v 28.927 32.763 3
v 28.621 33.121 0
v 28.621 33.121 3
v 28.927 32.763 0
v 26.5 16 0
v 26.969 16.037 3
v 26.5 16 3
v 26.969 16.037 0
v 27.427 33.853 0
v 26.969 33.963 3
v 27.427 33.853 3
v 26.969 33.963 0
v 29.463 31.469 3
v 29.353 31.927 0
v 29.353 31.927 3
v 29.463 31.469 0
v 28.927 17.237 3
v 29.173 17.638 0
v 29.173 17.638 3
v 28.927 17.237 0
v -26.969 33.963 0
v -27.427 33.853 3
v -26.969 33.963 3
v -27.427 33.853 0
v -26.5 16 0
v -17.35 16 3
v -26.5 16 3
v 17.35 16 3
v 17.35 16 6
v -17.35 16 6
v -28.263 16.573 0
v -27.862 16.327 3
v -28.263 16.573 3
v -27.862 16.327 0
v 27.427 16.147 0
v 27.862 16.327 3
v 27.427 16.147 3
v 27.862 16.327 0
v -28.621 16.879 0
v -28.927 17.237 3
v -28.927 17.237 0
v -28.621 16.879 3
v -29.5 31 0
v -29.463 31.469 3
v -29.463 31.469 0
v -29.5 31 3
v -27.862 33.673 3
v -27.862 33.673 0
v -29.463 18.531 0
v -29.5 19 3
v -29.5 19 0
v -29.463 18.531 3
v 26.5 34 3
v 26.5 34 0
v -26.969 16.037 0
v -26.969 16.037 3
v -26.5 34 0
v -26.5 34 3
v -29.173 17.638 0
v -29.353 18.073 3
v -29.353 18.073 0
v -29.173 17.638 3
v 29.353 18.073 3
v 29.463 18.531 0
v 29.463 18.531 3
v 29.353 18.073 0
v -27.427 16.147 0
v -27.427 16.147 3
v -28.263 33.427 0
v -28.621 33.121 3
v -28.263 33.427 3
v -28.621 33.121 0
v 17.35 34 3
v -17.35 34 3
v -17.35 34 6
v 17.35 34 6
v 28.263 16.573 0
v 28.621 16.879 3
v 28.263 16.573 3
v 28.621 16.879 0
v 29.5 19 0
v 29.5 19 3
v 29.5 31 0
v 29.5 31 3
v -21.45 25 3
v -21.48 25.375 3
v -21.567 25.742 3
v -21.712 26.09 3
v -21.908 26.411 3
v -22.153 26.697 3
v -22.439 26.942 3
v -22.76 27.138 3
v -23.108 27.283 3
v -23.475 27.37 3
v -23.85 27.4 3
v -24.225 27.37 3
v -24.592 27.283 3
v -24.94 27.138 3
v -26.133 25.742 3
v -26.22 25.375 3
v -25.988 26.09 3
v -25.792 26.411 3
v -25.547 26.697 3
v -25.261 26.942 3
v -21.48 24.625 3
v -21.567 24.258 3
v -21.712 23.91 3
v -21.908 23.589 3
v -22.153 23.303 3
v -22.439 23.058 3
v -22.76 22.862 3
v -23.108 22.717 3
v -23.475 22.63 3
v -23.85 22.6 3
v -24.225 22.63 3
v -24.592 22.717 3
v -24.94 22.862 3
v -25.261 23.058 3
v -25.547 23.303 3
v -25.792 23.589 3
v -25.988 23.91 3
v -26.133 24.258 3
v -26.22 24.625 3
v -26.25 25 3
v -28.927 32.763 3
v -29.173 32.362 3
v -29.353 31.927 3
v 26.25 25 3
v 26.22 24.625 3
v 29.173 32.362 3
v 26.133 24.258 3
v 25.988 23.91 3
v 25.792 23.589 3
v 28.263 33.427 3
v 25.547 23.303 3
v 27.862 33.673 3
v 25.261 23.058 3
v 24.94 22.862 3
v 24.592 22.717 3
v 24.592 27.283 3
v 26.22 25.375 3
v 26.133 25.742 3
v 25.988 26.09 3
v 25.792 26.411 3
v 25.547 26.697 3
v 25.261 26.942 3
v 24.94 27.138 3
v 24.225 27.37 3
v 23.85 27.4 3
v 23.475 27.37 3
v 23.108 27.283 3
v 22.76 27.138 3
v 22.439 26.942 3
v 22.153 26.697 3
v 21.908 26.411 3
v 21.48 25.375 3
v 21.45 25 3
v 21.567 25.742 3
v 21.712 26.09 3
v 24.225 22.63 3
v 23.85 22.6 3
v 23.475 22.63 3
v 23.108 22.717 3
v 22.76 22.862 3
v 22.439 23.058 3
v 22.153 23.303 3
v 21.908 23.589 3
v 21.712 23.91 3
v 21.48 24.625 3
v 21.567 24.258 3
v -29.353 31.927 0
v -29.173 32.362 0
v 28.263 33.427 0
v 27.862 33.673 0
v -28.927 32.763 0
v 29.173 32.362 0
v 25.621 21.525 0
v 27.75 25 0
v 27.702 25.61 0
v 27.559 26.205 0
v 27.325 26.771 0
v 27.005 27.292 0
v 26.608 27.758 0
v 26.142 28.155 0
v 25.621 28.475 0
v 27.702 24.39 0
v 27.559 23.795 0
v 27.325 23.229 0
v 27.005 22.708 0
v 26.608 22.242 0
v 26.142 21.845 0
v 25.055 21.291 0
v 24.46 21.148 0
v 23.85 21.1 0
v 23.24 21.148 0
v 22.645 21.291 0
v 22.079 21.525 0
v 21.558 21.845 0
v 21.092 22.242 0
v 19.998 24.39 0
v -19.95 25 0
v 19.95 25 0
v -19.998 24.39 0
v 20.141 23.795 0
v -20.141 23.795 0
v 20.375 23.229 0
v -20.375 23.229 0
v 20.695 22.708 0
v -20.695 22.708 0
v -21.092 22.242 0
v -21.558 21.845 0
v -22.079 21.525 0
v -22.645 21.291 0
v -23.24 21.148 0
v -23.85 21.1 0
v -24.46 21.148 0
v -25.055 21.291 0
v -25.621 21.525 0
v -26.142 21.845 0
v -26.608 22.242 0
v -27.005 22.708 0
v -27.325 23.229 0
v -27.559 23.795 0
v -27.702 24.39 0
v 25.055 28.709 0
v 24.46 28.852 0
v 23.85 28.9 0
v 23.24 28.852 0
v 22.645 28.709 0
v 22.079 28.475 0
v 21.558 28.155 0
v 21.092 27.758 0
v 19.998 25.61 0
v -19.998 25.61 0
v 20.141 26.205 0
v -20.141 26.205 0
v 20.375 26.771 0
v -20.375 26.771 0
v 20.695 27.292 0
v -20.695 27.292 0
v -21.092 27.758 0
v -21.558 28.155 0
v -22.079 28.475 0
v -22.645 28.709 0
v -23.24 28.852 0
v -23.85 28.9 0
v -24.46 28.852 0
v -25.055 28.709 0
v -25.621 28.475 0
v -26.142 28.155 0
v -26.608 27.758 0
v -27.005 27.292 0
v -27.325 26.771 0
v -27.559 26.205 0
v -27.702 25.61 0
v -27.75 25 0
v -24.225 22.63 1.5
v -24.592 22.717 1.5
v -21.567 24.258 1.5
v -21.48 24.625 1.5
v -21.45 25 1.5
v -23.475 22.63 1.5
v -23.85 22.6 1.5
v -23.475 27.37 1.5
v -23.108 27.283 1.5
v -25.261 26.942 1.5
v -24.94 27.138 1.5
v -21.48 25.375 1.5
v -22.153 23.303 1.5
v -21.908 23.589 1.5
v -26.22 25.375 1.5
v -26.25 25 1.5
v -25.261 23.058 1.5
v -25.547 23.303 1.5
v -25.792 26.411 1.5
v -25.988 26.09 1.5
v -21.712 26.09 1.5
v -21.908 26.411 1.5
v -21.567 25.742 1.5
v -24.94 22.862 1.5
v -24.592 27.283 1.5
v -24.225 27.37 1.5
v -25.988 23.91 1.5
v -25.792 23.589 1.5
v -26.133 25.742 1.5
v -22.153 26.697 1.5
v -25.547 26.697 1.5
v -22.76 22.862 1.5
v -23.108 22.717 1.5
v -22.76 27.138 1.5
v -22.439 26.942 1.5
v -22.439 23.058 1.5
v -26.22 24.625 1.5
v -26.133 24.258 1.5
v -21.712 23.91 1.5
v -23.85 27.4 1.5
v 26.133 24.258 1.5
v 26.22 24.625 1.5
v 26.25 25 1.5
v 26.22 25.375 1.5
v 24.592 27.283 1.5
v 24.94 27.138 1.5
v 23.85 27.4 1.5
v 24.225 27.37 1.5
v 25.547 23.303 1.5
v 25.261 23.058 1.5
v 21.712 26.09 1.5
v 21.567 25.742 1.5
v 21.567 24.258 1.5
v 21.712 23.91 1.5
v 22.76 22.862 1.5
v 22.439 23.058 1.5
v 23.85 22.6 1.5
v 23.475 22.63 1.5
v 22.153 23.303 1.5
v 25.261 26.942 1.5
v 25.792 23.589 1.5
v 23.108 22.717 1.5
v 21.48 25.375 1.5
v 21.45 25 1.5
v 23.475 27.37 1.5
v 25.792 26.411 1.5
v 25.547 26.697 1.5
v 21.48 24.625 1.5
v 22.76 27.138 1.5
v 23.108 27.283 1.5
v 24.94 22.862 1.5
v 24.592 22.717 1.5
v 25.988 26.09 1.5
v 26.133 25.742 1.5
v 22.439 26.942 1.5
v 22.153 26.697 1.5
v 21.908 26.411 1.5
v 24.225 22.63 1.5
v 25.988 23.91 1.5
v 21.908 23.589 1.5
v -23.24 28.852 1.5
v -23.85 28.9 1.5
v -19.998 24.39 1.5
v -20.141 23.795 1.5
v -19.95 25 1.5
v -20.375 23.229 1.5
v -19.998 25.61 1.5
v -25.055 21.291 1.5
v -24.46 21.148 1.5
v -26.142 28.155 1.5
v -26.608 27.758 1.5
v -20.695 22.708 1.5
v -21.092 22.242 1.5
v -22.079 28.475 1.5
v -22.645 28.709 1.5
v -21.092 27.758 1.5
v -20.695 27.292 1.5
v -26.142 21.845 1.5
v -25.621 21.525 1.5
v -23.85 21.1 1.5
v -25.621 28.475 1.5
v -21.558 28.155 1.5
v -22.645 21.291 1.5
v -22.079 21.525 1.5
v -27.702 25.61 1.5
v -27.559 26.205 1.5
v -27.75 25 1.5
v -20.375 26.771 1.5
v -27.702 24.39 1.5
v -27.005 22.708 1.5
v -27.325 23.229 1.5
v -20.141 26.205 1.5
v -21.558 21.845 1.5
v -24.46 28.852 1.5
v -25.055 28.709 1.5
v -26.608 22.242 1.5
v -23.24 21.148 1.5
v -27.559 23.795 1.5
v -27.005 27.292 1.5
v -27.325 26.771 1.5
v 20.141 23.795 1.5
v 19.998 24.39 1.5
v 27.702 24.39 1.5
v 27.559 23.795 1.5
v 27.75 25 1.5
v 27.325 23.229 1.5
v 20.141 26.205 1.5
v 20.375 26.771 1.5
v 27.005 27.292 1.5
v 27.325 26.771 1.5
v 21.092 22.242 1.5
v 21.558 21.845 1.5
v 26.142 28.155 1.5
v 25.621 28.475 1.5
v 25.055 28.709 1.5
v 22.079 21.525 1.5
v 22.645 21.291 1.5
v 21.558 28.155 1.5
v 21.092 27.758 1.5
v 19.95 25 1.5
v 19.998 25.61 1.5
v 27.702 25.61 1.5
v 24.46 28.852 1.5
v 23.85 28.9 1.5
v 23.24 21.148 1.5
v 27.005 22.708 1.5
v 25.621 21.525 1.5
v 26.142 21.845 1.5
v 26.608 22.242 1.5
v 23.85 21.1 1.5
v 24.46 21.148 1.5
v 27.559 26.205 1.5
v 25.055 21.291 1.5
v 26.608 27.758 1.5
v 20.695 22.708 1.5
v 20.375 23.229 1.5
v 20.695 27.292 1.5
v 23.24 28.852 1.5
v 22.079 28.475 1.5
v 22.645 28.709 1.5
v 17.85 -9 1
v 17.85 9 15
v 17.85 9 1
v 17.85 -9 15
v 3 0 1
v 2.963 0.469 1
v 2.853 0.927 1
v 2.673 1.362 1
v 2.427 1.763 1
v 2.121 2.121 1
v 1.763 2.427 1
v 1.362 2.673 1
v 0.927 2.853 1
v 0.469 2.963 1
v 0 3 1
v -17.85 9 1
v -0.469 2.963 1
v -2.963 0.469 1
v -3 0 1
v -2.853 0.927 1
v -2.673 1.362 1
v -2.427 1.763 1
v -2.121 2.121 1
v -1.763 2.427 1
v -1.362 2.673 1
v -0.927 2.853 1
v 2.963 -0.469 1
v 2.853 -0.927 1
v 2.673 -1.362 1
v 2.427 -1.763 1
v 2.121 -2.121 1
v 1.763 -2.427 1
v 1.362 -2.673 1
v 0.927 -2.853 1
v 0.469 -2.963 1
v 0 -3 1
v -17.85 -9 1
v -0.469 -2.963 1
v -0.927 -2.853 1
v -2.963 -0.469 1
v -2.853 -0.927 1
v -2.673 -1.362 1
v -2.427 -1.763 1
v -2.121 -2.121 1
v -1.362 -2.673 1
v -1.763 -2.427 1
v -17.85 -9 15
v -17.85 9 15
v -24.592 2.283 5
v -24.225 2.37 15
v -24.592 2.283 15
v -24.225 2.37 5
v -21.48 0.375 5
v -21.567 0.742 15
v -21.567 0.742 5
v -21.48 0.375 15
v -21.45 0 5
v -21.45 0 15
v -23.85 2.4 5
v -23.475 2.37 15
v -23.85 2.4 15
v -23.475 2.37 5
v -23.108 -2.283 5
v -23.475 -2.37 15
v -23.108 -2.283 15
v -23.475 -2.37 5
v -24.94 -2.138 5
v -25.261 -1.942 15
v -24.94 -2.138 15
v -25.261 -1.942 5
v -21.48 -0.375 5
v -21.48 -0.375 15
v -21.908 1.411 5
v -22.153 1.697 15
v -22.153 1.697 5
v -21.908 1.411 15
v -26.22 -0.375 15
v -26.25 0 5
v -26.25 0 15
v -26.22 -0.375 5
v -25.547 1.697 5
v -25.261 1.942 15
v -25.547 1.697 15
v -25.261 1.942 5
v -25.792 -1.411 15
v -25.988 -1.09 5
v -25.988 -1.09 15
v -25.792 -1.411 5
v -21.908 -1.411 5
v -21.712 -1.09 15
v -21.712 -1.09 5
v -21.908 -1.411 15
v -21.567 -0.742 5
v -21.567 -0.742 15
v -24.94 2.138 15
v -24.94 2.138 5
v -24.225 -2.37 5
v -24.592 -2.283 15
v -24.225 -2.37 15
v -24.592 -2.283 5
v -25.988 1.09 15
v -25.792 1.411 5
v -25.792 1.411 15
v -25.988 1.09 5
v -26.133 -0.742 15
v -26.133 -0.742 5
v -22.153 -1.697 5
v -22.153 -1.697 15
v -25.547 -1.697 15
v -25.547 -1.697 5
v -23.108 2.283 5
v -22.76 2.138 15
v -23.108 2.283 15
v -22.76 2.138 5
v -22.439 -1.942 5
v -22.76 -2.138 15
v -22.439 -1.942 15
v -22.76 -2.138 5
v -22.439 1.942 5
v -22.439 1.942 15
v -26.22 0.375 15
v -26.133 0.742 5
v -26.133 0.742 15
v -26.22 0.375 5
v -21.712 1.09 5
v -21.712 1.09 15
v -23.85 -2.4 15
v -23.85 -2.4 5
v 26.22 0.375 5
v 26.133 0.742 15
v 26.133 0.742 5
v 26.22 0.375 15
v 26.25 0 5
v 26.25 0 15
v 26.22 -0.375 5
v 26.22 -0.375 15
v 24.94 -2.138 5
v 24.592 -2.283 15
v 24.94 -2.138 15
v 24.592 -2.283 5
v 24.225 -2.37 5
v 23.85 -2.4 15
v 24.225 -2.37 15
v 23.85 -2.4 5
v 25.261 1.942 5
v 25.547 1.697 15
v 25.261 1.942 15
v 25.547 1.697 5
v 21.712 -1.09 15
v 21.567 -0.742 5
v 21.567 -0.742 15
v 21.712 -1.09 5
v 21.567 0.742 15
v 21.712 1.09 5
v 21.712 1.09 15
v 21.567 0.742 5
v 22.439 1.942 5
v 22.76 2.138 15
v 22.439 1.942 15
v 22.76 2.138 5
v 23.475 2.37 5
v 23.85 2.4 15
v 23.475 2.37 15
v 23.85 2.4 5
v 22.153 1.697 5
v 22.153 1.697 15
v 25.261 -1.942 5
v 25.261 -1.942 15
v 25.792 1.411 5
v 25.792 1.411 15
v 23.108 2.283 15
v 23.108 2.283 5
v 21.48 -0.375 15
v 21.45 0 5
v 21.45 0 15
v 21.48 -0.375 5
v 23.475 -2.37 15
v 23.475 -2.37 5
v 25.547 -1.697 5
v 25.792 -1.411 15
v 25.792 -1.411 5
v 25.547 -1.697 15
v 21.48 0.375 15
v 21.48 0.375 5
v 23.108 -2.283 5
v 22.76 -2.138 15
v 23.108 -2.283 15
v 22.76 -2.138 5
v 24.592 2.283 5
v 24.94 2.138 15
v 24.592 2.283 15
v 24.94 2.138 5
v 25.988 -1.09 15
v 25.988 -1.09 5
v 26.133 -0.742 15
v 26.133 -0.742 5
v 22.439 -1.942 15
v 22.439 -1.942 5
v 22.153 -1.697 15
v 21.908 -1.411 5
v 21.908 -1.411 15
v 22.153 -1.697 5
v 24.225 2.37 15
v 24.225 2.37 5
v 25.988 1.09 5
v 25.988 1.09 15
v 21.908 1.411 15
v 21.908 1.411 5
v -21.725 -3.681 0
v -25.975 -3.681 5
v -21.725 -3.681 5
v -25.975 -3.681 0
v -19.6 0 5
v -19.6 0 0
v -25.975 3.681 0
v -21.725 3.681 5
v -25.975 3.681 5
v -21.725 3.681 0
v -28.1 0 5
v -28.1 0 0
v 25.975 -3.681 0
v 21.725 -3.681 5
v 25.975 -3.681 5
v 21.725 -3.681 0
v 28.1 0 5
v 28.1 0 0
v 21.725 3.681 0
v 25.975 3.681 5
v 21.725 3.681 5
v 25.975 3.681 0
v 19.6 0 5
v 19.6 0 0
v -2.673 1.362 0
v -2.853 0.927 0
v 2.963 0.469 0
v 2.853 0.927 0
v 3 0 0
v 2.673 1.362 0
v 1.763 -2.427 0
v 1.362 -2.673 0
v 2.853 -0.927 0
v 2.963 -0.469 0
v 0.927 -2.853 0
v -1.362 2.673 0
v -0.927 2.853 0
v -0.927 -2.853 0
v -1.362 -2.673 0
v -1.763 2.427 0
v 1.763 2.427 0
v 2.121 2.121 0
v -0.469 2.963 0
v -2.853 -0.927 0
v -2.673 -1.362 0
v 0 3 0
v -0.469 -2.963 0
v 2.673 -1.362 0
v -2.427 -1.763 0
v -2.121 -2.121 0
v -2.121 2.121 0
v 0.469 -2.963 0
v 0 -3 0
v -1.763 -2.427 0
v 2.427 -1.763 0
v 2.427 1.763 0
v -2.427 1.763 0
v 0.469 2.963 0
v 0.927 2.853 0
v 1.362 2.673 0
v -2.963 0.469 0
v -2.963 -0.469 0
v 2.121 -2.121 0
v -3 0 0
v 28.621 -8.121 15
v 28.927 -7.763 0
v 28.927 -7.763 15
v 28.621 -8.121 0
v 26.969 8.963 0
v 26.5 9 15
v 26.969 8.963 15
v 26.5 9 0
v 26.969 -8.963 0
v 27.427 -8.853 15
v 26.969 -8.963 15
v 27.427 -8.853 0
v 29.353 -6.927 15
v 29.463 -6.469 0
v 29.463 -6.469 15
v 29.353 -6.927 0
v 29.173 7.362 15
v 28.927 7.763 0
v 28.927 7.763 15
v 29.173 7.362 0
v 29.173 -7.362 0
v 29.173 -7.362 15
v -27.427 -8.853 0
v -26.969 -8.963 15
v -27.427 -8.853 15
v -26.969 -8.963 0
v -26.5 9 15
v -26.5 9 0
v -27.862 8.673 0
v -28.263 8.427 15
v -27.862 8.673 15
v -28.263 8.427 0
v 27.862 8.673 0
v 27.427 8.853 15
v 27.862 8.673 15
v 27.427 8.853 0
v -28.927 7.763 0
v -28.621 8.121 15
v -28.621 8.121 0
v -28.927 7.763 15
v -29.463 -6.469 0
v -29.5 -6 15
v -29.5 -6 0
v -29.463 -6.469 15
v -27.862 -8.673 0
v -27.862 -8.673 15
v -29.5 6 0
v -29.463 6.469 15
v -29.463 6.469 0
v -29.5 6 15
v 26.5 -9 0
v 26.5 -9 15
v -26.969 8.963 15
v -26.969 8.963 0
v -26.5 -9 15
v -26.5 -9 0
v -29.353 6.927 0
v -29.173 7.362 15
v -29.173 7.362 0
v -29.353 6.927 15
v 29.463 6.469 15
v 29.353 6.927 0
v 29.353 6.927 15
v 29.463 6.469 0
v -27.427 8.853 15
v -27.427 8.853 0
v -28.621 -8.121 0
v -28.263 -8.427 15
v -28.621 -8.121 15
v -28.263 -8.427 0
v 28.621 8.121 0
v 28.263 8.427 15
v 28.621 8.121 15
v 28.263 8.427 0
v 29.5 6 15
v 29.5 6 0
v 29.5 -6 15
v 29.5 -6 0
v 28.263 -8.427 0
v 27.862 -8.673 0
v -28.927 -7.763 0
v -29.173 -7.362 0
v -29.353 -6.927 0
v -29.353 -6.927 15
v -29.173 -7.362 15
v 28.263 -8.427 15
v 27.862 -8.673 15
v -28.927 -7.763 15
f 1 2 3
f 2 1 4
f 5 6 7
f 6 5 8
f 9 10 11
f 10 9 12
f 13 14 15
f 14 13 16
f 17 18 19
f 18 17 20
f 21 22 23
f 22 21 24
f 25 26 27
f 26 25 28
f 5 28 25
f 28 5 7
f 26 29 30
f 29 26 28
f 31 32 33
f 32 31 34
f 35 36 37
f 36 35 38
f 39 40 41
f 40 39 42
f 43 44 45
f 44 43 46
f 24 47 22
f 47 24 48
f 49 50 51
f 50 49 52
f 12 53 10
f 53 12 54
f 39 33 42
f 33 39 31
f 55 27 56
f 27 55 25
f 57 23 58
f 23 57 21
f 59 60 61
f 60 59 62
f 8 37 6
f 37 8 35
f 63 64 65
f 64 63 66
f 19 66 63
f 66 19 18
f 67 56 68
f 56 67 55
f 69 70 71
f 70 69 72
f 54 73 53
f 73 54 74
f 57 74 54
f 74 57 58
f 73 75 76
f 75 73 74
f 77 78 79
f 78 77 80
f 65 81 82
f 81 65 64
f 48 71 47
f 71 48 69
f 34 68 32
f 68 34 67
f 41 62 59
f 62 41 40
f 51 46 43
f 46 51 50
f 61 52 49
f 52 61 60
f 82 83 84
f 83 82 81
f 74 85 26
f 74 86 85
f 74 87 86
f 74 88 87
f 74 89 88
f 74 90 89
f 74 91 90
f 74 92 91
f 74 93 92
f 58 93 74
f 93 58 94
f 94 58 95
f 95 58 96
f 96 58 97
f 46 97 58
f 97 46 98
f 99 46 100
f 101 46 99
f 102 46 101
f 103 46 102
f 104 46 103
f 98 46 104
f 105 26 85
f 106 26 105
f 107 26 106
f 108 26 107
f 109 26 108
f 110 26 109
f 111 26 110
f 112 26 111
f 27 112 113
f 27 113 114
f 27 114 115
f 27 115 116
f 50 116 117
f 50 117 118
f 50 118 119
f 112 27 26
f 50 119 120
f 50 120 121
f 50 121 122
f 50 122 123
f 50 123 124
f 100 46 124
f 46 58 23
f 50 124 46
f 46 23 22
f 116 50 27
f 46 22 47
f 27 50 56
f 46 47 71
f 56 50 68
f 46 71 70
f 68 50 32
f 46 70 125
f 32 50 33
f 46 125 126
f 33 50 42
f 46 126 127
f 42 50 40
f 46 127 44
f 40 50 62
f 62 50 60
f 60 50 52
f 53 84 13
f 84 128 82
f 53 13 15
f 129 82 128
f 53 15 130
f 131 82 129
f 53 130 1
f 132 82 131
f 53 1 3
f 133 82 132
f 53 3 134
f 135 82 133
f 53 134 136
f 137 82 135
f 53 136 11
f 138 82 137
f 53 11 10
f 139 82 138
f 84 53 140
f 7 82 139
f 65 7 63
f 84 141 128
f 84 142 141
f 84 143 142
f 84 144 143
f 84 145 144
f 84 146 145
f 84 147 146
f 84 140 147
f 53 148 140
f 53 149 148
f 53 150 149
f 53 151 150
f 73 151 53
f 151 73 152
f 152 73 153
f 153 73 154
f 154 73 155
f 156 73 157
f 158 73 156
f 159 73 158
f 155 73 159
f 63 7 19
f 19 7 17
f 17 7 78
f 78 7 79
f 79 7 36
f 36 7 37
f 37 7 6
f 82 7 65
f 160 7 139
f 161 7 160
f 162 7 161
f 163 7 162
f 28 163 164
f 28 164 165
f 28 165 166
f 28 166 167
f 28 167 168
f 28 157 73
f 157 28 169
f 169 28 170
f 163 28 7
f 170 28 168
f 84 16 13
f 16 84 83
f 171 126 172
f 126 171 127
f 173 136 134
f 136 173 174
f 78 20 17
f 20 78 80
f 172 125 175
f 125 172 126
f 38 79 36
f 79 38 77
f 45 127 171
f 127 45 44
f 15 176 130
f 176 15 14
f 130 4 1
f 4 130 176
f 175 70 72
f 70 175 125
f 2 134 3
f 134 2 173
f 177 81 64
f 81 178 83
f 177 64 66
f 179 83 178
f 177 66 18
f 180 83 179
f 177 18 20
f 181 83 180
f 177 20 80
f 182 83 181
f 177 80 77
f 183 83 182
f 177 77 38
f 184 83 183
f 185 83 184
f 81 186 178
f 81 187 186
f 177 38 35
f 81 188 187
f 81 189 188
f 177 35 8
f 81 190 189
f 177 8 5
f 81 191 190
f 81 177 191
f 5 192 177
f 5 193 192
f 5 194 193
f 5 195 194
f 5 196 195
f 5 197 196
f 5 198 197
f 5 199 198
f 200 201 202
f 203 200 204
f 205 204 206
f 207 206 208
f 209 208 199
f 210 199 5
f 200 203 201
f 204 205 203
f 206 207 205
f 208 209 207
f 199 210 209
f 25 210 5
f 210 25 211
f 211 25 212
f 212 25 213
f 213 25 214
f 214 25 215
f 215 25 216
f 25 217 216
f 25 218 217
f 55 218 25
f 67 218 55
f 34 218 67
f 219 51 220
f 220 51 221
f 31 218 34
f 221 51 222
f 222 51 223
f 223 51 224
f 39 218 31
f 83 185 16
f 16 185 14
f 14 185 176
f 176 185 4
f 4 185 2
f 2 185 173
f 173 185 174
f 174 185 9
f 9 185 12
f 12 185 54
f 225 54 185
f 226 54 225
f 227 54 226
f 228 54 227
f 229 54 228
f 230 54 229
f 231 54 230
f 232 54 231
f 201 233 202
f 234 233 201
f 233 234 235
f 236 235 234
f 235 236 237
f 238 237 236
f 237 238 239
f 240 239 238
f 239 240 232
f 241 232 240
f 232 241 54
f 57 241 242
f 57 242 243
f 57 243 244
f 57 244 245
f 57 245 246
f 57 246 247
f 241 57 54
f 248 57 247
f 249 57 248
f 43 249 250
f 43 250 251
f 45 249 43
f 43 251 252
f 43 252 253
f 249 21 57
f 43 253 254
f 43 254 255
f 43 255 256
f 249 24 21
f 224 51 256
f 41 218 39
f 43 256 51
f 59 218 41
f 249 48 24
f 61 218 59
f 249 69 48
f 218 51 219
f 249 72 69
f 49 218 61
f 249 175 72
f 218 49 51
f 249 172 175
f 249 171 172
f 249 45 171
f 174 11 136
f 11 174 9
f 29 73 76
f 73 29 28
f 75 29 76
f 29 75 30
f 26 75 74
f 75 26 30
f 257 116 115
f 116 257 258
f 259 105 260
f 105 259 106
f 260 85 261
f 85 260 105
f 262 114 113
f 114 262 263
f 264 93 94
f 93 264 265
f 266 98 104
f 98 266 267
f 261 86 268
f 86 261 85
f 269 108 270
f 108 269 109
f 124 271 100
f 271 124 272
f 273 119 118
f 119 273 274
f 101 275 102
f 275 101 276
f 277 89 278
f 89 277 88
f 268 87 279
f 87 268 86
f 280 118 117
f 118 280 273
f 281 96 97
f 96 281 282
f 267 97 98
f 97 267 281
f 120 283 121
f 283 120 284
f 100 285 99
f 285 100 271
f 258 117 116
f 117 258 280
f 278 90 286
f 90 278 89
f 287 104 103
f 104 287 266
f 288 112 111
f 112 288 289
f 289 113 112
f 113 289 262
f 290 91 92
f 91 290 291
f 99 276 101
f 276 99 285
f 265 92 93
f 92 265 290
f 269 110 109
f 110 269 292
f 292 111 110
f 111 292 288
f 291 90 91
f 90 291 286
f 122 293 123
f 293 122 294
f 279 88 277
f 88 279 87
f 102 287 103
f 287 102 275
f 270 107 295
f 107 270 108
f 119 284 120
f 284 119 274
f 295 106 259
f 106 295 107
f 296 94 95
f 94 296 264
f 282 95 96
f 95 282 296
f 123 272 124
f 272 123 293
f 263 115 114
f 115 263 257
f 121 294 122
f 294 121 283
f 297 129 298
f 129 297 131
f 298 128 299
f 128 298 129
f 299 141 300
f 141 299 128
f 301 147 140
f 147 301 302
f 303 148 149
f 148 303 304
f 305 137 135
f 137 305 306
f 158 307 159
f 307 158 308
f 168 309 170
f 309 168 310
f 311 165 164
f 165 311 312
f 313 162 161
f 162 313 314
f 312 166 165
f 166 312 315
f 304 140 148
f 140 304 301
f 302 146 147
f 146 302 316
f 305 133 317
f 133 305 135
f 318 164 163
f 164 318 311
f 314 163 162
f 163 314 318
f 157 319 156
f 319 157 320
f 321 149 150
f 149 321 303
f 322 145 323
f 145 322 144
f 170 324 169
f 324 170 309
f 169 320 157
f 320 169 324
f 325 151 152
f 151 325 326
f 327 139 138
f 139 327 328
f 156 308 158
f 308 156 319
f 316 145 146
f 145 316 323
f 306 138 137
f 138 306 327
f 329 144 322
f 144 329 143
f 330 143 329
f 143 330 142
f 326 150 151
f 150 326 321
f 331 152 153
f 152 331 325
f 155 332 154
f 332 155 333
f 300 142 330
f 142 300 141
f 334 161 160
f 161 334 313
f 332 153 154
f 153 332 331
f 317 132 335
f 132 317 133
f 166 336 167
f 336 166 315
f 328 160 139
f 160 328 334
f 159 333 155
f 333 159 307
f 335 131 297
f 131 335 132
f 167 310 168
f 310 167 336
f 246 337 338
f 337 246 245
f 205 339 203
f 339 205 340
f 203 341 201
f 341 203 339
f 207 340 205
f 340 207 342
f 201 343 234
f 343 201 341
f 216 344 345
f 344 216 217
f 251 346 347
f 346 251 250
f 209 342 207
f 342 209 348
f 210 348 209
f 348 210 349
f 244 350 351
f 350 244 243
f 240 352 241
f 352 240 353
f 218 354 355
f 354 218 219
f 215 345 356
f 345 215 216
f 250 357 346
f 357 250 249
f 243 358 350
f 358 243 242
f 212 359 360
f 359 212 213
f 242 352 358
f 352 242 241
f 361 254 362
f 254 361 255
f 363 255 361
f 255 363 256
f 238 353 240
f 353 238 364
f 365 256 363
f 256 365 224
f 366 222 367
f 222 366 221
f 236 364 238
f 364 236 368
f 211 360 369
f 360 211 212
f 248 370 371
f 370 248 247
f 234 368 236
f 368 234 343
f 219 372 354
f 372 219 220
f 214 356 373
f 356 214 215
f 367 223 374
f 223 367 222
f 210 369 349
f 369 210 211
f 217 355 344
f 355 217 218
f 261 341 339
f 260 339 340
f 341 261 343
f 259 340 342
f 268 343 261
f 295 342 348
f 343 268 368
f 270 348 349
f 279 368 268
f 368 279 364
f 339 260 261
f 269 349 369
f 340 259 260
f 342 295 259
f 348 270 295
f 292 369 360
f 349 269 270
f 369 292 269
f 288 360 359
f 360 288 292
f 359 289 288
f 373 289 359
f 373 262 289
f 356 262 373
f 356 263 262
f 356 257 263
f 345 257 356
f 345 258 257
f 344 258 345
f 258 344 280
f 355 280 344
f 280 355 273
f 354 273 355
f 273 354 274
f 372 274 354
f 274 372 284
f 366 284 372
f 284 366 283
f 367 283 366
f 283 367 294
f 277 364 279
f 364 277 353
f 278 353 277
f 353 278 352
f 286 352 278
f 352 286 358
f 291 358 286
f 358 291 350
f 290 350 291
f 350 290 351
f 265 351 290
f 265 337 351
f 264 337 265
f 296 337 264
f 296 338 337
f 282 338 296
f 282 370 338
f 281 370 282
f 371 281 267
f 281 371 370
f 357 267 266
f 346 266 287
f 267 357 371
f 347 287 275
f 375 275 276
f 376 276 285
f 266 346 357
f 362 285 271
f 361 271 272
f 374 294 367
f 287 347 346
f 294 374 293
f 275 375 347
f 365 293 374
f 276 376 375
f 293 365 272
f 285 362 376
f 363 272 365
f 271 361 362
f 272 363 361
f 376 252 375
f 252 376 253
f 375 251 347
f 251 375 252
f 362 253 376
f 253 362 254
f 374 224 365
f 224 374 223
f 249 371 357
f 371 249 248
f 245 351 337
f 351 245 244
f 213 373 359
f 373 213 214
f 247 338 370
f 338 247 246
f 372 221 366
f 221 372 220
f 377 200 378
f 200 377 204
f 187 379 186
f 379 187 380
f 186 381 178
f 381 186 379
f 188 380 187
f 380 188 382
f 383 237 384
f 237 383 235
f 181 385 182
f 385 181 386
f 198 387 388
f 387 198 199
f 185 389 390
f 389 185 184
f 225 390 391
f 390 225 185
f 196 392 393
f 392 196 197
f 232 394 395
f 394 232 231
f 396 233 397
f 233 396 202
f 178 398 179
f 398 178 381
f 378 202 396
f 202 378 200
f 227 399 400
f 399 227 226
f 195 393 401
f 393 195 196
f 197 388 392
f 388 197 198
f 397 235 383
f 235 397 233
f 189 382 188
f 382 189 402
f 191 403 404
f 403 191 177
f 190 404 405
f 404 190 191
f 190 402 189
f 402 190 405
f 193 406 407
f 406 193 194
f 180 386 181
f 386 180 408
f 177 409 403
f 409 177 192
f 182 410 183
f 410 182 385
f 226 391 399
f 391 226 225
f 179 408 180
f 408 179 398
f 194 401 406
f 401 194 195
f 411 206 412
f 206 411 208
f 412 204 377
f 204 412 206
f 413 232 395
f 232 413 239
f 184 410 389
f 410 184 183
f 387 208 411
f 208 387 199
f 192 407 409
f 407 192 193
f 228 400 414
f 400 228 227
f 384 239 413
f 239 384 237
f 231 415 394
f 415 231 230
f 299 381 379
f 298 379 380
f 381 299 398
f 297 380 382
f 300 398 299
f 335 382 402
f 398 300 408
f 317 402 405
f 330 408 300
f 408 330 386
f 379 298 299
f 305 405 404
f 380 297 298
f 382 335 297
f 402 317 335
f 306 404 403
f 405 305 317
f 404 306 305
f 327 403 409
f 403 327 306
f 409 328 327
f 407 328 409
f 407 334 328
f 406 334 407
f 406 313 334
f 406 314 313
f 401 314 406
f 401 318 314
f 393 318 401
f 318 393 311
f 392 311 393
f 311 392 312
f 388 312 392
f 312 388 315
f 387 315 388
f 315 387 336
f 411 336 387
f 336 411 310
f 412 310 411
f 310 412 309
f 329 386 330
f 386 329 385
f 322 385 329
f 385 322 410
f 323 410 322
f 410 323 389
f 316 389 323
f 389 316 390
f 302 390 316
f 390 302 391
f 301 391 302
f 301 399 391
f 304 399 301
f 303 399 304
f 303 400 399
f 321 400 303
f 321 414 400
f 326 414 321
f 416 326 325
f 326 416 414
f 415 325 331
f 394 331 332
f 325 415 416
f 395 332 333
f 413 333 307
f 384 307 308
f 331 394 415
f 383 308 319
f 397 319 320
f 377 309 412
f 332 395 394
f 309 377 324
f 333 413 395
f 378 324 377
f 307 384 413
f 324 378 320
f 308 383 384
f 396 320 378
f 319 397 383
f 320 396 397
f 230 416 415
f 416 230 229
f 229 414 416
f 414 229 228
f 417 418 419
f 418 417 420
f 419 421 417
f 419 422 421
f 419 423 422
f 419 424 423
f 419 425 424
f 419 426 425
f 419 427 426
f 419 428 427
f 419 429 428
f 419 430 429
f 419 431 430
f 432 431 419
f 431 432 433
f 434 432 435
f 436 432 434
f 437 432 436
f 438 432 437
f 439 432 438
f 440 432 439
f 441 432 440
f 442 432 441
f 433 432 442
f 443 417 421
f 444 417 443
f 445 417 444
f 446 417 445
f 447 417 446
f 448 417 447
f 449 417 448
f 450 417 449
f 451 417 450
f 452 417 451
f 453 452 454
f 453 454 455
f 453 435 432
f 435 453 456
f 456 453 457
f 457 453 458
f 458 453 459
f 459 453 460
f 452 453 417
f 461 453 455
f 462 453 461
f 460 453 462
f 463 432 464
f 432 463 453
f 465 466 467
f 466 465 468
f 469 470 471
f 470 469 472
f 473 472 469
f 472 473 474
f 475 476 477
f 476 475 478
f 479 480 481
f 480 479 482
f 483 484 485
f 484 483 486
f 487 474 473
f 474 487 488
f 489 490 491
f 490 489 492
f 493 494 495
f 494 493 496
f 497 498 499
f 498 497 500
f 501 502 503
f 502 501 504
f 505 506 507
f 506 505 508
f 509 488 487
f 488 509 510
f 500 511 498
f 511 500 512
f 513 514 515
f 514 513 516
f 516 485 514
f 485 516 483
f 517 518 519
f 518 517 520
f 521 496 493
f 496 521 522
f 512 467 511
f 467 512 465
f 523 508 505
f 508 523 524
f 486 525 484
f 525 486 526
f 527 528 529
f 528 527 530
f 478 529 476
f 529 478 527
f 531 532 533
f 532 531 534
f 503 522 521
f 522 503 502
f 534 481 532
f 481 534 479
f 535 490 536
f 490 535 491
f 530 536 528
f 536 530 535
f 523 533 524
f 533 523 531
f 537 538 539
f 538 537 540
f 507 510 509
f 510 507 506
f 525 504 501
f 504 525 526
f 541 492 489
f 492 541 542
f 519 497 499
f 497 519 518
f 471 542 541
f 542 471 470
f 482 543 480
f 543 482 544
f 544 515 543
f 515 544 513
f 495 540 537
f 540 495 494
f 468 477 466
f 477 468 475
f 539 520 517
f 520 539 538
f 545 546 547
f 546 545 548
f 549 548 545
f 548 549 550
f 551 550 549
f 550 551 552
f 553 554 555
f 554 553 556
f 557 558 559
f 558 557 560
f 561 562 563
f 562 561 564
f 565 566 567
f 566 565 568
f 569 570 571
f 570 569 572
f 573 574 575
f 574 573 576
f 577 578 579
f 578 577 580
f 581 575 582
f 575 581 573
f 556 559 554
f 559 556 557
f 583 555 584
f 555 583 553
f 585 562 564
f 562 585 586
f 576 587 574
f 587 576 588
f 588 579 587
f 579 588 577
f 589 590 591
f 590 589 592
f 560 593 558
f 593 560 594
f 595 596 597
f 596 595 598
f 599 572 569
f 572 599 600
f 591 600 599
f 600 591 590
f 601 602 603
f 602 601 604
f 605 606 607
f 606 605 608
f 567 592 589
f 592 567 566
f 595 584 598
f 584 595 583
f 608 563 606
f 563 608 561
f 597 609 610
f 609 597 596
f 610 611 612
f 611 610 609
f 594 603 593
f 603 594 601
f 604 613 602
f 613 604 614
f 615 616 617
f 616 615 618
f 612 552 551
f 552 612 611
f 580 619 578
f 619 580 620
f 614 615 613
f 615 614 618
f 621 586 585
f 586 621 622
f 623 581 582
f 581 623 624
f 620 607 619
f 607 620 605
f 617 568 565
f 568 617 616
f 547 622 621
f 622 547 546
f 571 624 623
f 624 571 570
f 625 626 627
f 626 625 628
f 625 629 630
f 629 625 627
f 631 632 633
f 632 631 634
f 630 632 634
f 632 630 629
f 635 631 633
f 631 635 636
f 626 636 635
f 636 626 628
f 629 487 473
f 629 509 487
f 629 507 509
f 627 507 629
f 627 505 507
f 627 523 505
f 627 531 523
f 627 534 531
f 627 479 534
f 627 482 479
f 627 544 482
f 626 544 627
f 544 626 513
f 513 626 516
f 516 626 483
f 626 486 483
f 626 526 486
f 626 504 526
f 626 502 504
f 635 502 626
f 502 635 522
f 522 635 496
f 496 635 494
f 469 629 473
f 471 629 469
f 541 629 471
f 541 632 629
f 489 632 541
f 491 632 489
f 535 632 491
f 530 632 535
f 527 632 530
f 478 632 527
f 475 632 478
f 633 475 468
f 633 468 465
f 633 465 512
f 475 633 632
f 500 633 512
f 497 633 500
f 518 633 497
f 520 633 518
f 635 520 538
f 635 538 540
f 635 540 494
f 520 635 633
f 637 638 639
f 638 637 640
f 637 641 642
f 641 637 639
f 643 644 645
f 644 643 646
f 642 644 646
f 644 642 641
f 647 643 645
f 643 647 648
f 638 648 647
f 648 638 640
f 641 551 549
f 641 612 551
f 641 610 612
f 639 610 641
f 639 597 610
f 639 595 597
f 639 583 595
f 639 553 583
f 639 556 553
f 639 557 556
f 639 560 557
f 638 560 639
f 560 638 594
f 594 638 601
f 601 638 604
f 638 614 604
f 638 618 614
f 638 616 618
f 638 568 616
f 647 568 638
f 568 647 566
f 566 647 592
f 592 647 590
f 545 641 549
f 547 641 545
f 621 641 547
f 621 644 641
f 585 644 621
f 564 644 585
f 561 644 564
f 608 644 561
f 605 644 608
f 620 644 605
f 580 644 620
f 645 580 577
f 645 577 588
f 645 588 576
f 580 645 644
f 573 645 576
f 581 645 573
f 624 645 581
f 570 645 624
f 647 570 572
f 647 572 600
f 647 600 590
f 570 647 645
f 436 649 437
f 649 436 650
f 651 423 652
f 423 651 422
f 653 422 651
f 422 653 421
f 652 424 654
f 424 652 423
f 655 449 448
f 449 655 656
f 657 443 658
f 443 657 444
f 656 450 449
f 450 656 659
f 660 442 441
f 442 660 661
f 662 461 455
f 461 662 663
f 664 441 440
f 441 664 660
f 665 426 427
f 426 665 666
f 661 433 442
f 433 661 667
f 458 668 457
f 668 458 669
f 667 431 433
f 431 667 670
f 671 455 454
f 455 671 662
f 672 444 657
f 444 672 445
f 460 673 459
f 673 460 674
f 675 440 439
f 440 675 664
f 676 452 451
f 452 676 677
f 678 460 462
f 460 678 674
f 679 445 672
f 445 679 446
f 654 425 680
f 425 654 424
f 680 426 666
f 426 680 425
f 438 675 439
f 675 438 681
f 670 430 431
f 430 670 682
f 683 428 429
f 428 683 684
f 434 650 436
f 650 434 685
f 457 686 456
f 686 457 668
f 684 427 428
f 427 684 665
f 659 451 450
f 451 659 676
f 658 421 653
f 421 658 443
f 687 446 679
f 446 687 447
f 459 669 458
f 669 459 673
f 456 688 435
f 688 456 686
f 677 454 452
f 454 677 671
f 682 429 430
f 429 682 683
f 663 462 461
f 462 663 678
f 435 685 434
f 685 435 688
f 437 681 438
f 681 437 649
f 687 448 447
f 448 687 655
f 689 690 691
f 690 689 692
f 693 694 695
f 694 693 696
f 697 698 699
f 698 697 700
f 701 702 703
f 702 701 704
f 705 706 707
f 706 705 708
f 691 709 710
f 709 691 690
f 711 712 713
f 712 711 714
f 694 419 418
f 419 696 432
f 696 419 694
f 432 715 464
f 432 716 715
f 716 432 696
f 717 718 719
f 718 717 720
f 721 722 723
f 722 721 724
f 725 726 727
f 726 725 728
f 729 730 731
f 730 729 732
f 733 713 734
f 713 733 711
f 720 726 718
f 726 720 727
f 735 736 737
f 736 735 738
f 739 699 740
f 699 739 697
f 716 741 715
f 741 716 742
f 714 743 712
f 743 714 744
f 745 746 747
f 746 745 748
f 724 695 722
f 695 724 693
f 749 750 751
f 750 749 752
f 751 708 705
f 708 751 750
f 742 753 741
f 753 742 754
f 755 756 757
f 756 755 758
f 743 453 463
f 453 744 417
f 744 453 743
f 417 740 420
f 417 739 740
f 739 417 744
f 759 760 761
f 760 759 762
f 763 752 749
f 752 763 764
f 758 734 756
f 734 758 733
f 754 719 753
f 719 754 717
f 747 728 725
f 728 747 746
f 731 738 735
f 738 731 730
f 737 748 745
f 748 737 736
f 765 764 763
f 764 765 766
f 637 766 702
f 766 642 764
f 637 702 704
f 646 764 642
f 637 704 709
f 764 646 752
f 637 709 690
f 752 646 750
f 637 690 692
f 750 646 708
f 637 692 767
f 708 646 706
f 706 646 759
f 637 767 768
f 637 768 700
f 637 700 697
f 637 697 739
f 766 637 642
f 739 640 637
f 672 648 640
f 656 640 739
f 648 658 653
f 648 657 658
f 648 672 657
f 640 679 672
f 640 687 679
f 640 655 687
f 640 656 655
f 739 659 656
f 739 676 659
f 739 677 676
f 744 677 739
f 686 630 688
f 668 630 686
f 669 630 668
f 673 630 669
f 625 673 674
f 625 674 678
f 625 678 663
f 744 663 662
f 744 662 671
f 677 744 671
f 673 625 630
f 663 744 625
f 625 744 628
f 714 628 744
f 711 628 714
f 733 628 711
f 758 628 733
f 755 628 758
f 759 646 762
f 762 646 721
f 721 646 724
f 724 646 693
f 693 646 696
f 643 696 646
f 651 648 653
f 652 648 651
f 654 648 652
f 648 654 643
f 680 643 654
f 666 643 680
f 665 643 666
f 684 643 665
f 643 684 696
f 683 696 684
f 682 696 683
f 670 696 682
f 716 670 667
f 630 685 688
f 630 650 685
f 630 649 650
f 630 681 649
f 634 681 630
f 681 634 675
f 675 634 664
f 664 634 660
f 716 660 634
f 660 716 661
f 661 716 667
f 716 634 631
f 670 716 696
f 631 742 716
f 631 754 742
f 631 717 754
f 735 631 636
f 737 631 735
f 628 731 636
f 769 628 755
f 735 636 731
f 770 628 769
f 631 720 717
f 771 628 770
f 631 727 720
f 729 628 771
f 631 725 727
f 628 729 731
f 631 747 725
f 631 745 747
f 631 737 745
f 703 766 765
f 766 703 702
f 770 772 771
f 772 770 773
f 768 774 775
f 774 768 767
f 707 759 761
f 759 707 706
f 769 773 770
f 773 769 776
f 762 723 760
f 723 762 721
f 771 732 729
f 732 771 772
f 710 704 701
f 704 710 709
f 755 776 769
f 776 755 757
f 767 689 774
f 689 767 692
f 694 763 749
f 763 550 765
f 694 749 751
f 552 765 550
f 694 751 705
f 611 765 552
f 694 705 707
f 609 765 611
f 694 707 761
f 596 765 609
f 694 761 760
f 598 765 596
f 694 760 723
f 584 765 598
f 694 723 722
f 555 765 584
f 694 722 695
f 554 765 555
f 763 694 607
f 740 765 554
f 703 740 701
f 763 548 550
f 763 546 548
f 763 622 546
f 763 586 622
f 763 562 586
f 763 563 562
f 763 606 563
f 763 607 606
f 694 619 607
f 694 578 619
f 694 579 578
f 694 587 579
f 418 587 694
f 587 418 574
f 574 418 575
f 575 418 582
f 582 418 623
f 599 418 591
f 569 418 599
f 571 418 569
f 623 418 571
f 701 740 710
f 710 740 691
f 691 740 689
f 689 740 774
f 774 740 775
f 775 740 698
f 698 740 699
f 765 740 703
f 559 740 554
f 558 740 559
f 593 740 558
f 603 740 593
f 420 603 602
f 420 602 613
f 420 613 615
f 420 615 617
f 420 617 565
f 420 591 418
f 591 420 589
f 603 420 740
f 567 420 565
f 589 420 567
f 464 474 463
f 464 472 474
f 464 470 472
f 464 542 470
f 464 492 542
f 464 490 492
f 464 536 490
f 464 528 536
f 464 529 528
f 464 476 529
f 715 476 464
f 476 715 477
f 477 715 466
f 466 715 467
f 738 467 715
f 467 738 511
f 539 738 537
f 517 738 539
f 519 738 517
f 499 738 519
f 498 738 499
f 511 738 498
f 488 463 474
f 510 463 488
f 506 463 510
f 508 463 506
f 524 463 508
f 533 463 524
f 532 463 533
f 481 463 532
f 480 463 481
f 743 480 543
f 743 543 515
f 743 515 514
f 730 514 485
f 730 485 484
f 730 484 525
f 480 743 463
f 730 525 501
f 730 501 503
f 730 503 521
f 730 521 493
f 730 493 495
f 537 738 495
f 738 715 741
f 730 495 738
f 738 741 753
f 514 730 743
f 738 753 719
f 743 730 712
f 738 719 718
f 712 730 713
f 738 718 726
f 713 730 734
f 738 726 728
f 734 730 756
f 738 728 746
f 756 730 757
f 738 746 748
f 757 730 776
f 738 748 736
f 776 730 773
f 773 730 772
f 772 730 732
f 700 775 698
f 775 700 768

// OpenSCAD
R = 3;
sx = 35+.5+.2;

ox = 35+12*2;
oy = 18;

m=4.8;

module base() {
  h = 12+3;
  x = ox - R*2;
  y = oy - R*2;
  difference() {
    translate([0, 0, h/2])
      hull() {    
        translate([+x/2, +y/2, 0])
          cylinder(h=h, r1=R, r2=R, center=true, $fn=40);
        translate([+x/2, -y/2, 0])
          cylinder(h=h, r1=R, r2=R, center=true, $fn=40);  
        translate([-x/2, +y/2, 0])
          cylinder(h=h, r1=R, r2=R, center=true, $fn=40);
        translate([-x/2, -y/2, 0])
          cylinder(h=h, r1=R, r2=R, center=true, $fn=40);  
      }
    union() {
      translate([-sx/2, -20/2, 1])
        cube([sx, 20, 20], center=false);
      translate([-sx/2-6, 0, 0])
        cylinder(h=40, r1=m/2, r2=m/2, $fn=40, center=true);
      translate([+sx/2+6, 0, 0])
        cylinder(h=40, r1=m/2, r2=m/2, $fn=40, center=true);
      translate([-sx/2-6, 0, -40+5])
        cylinder(h=40, r1=8.5/2, r2=8.5/2, $fn=6, center=false);
      translate([+sx/2+6, 0, -40+5])
        cylinder(h=40, r1=8.5/2, r2=8.5/2, $fn=6, center=false);
      cylinder(h=40, r1=6/2, r2=6/2, $fn=40, center=true);
    }
  }
}


module cap() {
  h = 3;
  x = ox - R*2;
  y = oy - R*2;
 translate([0, 0, -h]) 
  difference() {
    translate([0, 0, h/2])
     union() {
      hull() {    
        translate([+x/2, +y/2, 0])
          cylinder(h=h, r1=R, r2=R, center=true, $fn=40);
        translate([+x/2, -y/2, 0])
          cylinder(h=h, r1=R, r2=R, center=true, $fn=40);  
        translate([-x/2, +y/2, 0])
          cylinder(h=h, r1=R, r2=R, center=true, $fn=40);
        translate([-x/2, -y/2, 0])
          cylinder(h=h, r1=R, r2=R, center=true, $fn=40);  
      }
      translate([-(sx-1)/2, -oy/2, -4-h/2+1])
        cube([sx-1, oy, 4], center=false);     
     }
    union() {
      translate([-sx/2-6, 0, 0])
        cylinder(h=40, r1=m/2, r2=m/2, $fn=40, center=true);
      translate([+sx/2+6, 0, 0])
        cylinder(h=40, r1=m/2, r2=m/2, $fn=40, center=true);
      translate([-sx/2-6, 0, 1.5])
        cylinder(h=40, r1=7.8/2, r2=7.8/2, $fn=40, center=false);
      translate([+sx/2+6, 0, 1.5])
        cylinder(h=40, r1=7.8/2, r2=7.8/2, $fn=40, center=false);
    }
  }
 
}

translate([0, 25, 0]) rotate([180,0,0])
cap();
base();
